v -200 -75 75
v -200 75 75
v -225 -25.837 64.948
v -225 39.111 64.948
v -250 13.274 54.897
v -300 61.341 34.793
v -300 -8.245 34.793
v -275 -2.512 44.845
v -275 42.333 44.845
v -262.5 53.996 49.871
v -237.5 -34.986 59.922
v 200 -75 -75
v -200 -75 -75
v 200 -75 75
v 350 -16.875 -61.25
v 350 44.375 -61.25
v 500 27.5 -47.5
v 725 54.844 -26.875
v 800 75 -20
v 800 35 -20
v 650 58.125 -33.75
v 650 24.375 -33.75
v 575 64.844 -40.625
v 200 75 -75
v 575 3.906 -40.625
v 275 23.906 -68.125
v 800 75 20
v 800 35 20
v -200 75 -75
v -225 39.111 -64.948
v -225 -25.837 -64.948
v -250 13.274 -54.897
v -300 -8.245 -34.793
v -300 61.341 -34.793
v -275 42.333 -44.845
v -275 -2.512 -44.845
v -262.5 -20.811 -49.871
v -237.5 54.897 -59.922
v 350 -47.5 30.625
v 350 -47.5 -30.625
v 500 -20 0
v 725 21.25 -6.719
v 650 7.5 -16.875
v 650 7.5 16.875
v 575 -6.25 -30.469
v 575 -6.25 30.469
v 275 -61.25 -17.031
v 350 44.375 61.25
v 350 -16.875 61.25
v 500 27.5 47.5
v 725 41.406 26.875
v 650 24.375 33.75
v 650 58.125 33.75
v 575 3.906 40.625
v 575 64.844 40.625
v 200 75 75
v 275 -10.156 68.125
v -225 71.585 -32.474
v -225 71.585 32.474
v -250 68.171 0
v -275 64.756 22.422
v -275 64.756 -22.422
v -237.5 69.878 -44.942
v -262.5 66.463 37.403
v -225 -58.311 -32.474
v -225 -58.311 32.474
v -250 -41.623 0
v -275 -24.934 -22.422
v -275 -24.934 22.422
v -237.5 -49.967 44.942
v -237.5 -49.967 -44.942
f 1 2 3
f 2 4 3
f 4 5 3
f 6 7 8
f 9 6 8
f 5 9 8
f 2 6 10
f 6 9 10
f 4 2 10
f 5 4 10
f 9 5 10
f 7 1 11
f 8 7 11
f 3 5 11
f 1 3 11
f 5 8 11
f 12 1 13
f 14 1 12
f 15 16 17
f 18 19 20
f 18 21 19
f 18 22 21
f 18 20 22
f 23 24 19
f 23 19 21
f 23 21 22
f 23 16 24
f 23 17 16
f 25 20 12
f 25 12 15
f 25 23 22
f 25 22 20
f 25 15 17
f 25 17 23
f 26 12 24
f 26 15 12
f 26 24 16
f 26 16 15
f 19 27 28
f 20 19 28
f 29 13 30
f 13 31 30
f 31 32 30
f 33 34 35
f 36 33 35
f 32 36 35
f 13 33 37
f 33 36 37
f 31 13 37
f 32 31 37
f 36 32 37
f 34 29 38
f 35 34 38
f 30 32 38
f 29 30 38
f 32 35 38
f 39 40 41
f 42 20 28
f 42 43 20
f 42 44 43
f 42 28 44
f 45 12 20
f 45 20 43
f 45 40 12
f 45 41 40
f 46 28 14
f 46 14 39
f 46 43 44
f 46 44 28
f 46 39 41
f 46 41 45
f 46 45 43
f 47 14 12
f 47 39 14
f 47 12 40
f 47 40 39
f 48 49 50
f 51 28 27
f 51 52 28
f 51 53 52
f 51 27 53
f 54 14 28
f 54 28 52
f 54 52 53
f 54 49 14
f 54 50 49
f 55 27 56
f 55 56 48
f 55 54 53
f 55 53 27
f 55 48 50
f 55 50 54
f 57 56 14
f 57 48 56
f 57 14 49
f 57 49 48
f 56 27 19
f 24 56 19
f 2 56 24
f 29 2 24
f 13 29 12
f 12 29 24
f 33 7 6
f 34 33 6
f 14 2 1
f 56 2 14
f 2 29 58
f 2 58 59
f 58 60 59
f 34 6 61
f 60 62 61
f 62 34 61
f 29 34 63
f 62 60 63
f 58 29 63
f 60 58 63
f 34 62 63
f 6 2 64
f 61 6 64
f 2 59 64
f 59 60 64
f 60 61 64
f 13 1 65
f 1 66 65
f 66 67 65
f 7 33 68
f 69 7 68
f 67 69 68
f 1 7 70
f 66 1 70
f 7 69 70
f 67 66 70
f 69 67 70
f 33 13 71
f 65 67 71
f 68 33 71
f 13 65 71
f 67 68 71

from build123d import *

# Parameters (mm, degrees)
SKETCH1_W           = 400
SKETCH1_H           = 150
BOSS_EXTRUDE2_DEPTH = 75


with BuildPart() as part:
    # Sketch1 → Boss-Extrude2 (new, symmetric)
    with BuildSketch(Plane.XY):
        Rectangle(SKETCH1_W, SKETCH1_H)
    extrude(amount=BOSS_EXTRUDE2_DEPTH, both=True)

    # Sketch3 → section 1 of loft1
    with BuildSketch(Plane.ZY.offset(300), mode=Mode.PRIVATE) as loft1_s1:
        with BuildLine():
            Line((-34.793227556, -8.245300123), (34.793227556, -8.245300123))
            Line((34.793227556, -8.245300123), (34.793227556, 61.34115499))
            Line((34.793227556, 61.34115499), (-34.793227556, 61.34115499))
            Line((-34.793227556, 61.34115499), (-34.793227556, -8.245300123))
        make_face()
    # loft from a face of the part (loft1)
    loft([part.faces().sort_by_distance((-200, 0, 0))[0], loft1_s1.sketch])

    # Sketch5 → section 0 of loft2
    with BuildSketch(Plane(origin=(800, 0, 0), x_dir=(0, 0, -1), z_dir=(1, 0, 0)), mode=Mode.PRIVATE) as loft2_s0:
        with BuildLine():
            Line((-20, 75), (20, 75))
            Line((20, 75), (20, 35))
            Line((20, 35), (-20, 35))
            Line((-20, 35), (-20, 75))
        make_face()
    # loft up to a face of the part (loft2)
    loft([loft2_s0.sketch, part.faces().sort_by_distance((200, 0, 0))[0]])


solid = part.part
